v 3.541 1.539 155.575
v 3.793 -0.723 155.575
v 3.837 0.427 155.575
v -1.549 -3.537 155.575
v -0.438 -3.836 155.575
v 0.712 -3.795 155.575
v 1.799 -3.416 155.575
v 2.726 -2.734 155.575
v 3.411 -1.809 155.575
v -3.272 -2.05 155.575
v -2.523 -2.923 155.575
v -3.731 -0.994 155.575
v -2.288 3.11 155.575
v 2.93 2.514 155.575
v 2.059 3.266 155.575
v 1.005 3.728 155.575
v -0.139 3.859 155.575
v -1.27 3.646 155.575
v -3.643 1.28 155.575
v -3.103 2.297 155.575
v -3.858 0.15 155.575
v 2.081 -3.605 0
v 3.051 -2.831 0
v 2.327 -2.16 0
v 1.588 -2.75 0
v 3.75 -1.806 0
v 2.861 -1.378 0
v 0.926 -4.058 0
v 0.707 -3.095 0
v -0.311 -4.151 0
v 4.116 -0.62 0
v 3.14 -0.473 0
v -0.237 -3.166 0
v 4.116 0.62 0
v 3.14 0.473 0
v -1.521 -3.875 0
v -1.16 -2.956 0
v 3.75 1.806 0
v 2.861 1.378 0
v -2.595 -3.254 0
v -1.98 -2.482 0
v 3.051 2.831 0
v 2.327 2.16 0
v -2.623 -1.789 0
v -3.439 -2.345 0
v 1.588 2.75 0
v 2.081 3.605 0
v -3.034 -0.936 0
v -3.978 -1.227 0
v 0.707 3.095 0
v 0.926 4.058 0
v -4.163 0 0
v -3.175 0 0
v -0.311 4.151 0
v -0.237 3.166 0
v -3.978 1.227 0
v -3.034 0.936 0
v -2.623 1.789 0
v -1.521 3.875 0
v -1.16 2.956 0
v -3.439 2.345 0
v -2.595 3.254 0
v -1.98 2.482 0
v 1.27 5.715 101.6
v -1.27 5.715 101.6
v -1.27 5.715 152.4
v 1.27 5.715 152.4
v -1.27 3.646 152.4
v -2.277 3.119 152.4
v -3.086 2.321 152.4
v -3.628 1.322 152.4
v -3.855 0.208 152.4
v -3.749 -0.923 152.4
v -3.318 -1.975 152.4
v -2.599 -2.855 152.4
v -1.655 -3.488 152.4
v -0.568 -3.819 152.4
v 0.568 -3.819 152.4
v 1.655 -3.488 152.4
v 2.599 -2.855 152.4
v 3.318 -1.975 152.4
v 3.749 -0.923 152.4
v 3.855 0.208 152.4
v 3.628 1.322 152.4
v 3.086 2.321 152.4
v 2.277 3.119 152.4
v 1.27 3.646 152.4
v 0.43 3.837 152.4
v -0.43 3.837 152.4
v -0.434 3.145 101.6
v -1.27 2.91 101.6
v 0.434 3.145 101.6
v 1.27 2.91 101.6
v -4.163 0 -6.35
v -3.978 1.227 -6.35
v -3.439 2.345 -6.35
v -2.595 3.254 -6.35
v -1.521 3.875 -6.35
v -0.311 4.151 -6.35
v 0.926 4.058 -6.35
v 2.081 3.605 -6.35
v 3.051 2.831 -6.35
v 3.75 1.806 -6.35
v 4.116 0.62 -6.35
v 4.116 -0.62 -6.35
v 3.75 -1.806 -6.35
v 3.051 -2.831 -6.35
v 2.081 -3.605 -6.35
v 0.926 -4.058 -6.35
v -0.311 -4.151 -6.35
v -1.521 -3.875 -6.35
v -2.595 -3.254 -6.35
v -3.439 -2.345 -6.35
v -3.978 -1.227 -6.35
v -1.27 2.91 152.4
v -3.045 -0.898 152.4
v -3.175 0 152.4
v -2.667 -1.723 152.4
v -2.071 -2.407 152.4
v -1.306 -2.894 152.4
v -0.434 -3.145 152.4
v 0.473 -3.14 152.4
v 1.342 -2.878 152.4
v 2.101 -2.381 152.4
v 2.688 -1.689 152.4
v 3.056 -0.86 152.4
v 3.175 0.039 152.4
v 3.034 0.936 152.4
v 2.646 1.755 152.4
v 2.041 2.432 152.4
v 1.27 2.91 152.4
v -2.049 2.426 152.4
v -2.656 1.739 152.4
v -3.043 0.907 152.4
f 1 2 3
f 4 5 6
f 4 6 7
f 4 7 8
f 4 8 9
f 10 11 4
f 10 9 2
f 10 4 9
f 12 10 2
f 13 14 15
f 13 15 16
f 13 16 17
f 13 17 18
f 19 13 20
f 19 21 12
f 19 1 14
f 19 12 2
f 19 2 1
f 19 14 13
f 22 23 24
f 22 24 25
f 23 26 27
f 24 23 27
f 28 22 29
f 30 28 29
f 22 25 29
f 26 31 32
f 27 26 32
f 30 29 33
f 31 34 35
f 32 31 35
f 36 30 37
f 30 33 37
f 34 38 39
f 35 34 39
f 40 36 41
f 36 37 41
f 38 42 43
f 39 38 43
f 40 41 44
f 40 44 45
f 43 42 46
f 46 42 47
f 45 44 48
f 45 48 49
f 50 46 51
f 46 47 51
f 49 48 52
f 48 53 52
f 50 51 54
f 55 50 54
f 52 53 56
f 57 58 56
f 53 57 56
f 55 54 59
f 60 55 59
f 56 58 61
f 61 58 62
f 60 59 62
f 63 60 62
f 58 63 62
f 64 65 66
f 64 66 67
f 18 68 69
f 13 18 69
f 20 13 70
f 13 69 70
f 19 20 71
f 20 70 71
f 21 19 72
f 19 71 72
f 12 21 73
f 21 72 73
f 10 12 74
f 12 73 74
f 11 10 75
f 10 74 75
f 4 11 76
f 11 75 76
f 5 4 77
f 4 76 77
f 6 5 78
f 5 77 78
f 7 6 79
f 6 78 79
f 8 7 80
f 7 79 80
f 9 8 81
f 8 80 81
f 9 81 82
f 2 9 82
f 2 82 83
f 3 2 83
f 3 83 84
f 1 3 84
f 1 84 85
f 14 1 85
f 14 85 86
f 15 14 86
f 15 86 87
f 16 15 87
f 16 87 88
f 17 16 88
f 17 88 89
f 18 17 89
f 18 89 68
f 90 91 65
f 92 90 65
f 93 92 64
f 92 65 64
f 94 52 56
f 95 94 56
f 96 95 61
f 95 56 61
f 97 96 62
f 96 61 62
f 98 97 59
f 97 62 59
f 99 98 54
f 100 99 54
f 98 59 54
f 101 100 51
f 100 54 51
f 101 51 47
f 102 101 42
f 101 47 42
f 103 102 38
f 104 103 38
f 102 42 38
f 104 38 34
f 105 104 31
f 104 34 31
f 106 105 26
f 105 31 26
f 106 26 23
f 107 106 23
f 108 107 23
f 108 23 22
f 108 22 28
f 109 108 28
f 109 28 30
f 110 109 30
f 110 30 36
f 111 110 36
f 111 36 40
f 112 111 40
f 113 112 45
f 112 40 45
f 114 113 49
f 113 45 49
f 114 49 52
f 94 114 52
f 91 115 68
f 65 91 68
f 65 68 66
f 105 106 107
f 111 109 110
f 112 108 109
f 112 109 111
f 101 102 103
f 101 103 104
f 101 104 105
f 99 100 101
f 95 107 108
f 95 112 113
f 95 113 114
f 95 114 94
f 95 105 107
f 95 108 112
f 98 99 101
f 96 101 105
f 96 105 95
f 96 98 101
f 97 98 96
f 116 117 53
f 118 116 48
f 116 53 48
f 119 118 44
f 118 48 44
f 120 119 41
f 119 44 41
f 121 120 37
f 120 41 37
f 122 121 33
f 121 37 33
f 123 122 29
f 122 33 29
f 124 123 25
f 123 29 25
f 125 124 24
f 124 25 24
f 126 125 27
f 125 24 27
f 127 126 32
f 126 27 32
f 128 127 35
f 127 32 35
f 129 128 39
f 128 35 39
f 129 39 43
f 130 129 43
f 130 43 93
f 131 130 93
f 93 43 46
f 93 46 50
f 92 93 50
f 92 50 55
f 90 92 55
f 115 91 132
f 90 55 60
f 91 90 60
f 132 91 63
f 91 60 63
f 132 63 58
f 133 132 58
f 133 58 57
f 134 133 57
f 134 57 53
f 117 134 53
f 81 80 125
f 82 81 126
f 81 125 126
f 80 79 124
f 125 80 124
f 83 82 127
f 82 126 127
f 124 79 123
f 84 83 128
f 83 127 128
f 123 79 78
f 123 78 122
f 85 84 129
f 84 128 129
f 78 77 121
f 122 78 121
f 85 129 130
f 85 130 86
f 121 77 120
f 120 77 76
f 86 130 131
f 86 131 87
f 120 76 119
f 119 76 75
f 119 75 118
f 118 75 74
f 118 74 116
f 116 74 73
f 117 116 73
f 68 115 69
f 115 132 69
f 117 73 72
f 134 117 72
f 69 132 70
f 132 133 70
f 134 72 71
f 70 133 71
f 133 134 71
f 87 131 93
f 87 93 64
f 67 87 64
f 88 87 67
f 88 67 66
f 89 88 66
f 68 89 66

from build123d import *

# Parameters (mm, degrees)
SKETCH1_R           = 3.175
BOSS_EXTRUDE1_DEPTH = 152.4
SKETCH2_W           = 2.54
SKETCH2_H           = 5.08
BOSS_EXTRUDE4_DEPTH = 50.8
SKETCH3_R           = 4.162568093
BOSS_EXTRUDE5_DEPTH = 6.35
SKETCH4_R           = 3.861049132
BOSS_EXTRUDE6_DEPTH = 3.175


with BuildPart() as part:
    # Sketch1 → Boss-Extrude1 (new body)
    with BuildSketch(Plane.XY):
        with Locations(Location((0, 0, 0), (0, 0, 180))):
            Circle(SKETCH1_R)
    extrude(amount=BOSS_EXTRUDE1_DEPTH)

    # Sketch2 → Boss-Extrude4 (add)
    with BuildSketch(Plane.XY.offset(152.4)):
        with Locations((0, 3.175)):
            Rectangle(SKETCH2_W, SKETCH2_H)
    extrude(amount=-BOSS_EXTRUDE4_DEPTH)

    # Sketch3 → Boss-Extrude5 (add)
    with BuildSketch(Plane(origin=(0, 0, 0), x_dir=(-1, 0, 0), z_dir=(0, 0, -1))):
        Circle(SKETCH3_R)
    extrude(amount=BOSS_EXTRUDE5_DEPTH)

    # Sketch4 → Boss-Extrude6 (add)
    with BuildSketch(Plane.XY.offset(152.4)):
        with Locations(Location((0, 0, 0), (0, 0, 109.203609726))):
            Circle(SKETCH4_R)
    extrude(amount=BOSS_EXTRUDE6_DEPTH)


solid = part.part
